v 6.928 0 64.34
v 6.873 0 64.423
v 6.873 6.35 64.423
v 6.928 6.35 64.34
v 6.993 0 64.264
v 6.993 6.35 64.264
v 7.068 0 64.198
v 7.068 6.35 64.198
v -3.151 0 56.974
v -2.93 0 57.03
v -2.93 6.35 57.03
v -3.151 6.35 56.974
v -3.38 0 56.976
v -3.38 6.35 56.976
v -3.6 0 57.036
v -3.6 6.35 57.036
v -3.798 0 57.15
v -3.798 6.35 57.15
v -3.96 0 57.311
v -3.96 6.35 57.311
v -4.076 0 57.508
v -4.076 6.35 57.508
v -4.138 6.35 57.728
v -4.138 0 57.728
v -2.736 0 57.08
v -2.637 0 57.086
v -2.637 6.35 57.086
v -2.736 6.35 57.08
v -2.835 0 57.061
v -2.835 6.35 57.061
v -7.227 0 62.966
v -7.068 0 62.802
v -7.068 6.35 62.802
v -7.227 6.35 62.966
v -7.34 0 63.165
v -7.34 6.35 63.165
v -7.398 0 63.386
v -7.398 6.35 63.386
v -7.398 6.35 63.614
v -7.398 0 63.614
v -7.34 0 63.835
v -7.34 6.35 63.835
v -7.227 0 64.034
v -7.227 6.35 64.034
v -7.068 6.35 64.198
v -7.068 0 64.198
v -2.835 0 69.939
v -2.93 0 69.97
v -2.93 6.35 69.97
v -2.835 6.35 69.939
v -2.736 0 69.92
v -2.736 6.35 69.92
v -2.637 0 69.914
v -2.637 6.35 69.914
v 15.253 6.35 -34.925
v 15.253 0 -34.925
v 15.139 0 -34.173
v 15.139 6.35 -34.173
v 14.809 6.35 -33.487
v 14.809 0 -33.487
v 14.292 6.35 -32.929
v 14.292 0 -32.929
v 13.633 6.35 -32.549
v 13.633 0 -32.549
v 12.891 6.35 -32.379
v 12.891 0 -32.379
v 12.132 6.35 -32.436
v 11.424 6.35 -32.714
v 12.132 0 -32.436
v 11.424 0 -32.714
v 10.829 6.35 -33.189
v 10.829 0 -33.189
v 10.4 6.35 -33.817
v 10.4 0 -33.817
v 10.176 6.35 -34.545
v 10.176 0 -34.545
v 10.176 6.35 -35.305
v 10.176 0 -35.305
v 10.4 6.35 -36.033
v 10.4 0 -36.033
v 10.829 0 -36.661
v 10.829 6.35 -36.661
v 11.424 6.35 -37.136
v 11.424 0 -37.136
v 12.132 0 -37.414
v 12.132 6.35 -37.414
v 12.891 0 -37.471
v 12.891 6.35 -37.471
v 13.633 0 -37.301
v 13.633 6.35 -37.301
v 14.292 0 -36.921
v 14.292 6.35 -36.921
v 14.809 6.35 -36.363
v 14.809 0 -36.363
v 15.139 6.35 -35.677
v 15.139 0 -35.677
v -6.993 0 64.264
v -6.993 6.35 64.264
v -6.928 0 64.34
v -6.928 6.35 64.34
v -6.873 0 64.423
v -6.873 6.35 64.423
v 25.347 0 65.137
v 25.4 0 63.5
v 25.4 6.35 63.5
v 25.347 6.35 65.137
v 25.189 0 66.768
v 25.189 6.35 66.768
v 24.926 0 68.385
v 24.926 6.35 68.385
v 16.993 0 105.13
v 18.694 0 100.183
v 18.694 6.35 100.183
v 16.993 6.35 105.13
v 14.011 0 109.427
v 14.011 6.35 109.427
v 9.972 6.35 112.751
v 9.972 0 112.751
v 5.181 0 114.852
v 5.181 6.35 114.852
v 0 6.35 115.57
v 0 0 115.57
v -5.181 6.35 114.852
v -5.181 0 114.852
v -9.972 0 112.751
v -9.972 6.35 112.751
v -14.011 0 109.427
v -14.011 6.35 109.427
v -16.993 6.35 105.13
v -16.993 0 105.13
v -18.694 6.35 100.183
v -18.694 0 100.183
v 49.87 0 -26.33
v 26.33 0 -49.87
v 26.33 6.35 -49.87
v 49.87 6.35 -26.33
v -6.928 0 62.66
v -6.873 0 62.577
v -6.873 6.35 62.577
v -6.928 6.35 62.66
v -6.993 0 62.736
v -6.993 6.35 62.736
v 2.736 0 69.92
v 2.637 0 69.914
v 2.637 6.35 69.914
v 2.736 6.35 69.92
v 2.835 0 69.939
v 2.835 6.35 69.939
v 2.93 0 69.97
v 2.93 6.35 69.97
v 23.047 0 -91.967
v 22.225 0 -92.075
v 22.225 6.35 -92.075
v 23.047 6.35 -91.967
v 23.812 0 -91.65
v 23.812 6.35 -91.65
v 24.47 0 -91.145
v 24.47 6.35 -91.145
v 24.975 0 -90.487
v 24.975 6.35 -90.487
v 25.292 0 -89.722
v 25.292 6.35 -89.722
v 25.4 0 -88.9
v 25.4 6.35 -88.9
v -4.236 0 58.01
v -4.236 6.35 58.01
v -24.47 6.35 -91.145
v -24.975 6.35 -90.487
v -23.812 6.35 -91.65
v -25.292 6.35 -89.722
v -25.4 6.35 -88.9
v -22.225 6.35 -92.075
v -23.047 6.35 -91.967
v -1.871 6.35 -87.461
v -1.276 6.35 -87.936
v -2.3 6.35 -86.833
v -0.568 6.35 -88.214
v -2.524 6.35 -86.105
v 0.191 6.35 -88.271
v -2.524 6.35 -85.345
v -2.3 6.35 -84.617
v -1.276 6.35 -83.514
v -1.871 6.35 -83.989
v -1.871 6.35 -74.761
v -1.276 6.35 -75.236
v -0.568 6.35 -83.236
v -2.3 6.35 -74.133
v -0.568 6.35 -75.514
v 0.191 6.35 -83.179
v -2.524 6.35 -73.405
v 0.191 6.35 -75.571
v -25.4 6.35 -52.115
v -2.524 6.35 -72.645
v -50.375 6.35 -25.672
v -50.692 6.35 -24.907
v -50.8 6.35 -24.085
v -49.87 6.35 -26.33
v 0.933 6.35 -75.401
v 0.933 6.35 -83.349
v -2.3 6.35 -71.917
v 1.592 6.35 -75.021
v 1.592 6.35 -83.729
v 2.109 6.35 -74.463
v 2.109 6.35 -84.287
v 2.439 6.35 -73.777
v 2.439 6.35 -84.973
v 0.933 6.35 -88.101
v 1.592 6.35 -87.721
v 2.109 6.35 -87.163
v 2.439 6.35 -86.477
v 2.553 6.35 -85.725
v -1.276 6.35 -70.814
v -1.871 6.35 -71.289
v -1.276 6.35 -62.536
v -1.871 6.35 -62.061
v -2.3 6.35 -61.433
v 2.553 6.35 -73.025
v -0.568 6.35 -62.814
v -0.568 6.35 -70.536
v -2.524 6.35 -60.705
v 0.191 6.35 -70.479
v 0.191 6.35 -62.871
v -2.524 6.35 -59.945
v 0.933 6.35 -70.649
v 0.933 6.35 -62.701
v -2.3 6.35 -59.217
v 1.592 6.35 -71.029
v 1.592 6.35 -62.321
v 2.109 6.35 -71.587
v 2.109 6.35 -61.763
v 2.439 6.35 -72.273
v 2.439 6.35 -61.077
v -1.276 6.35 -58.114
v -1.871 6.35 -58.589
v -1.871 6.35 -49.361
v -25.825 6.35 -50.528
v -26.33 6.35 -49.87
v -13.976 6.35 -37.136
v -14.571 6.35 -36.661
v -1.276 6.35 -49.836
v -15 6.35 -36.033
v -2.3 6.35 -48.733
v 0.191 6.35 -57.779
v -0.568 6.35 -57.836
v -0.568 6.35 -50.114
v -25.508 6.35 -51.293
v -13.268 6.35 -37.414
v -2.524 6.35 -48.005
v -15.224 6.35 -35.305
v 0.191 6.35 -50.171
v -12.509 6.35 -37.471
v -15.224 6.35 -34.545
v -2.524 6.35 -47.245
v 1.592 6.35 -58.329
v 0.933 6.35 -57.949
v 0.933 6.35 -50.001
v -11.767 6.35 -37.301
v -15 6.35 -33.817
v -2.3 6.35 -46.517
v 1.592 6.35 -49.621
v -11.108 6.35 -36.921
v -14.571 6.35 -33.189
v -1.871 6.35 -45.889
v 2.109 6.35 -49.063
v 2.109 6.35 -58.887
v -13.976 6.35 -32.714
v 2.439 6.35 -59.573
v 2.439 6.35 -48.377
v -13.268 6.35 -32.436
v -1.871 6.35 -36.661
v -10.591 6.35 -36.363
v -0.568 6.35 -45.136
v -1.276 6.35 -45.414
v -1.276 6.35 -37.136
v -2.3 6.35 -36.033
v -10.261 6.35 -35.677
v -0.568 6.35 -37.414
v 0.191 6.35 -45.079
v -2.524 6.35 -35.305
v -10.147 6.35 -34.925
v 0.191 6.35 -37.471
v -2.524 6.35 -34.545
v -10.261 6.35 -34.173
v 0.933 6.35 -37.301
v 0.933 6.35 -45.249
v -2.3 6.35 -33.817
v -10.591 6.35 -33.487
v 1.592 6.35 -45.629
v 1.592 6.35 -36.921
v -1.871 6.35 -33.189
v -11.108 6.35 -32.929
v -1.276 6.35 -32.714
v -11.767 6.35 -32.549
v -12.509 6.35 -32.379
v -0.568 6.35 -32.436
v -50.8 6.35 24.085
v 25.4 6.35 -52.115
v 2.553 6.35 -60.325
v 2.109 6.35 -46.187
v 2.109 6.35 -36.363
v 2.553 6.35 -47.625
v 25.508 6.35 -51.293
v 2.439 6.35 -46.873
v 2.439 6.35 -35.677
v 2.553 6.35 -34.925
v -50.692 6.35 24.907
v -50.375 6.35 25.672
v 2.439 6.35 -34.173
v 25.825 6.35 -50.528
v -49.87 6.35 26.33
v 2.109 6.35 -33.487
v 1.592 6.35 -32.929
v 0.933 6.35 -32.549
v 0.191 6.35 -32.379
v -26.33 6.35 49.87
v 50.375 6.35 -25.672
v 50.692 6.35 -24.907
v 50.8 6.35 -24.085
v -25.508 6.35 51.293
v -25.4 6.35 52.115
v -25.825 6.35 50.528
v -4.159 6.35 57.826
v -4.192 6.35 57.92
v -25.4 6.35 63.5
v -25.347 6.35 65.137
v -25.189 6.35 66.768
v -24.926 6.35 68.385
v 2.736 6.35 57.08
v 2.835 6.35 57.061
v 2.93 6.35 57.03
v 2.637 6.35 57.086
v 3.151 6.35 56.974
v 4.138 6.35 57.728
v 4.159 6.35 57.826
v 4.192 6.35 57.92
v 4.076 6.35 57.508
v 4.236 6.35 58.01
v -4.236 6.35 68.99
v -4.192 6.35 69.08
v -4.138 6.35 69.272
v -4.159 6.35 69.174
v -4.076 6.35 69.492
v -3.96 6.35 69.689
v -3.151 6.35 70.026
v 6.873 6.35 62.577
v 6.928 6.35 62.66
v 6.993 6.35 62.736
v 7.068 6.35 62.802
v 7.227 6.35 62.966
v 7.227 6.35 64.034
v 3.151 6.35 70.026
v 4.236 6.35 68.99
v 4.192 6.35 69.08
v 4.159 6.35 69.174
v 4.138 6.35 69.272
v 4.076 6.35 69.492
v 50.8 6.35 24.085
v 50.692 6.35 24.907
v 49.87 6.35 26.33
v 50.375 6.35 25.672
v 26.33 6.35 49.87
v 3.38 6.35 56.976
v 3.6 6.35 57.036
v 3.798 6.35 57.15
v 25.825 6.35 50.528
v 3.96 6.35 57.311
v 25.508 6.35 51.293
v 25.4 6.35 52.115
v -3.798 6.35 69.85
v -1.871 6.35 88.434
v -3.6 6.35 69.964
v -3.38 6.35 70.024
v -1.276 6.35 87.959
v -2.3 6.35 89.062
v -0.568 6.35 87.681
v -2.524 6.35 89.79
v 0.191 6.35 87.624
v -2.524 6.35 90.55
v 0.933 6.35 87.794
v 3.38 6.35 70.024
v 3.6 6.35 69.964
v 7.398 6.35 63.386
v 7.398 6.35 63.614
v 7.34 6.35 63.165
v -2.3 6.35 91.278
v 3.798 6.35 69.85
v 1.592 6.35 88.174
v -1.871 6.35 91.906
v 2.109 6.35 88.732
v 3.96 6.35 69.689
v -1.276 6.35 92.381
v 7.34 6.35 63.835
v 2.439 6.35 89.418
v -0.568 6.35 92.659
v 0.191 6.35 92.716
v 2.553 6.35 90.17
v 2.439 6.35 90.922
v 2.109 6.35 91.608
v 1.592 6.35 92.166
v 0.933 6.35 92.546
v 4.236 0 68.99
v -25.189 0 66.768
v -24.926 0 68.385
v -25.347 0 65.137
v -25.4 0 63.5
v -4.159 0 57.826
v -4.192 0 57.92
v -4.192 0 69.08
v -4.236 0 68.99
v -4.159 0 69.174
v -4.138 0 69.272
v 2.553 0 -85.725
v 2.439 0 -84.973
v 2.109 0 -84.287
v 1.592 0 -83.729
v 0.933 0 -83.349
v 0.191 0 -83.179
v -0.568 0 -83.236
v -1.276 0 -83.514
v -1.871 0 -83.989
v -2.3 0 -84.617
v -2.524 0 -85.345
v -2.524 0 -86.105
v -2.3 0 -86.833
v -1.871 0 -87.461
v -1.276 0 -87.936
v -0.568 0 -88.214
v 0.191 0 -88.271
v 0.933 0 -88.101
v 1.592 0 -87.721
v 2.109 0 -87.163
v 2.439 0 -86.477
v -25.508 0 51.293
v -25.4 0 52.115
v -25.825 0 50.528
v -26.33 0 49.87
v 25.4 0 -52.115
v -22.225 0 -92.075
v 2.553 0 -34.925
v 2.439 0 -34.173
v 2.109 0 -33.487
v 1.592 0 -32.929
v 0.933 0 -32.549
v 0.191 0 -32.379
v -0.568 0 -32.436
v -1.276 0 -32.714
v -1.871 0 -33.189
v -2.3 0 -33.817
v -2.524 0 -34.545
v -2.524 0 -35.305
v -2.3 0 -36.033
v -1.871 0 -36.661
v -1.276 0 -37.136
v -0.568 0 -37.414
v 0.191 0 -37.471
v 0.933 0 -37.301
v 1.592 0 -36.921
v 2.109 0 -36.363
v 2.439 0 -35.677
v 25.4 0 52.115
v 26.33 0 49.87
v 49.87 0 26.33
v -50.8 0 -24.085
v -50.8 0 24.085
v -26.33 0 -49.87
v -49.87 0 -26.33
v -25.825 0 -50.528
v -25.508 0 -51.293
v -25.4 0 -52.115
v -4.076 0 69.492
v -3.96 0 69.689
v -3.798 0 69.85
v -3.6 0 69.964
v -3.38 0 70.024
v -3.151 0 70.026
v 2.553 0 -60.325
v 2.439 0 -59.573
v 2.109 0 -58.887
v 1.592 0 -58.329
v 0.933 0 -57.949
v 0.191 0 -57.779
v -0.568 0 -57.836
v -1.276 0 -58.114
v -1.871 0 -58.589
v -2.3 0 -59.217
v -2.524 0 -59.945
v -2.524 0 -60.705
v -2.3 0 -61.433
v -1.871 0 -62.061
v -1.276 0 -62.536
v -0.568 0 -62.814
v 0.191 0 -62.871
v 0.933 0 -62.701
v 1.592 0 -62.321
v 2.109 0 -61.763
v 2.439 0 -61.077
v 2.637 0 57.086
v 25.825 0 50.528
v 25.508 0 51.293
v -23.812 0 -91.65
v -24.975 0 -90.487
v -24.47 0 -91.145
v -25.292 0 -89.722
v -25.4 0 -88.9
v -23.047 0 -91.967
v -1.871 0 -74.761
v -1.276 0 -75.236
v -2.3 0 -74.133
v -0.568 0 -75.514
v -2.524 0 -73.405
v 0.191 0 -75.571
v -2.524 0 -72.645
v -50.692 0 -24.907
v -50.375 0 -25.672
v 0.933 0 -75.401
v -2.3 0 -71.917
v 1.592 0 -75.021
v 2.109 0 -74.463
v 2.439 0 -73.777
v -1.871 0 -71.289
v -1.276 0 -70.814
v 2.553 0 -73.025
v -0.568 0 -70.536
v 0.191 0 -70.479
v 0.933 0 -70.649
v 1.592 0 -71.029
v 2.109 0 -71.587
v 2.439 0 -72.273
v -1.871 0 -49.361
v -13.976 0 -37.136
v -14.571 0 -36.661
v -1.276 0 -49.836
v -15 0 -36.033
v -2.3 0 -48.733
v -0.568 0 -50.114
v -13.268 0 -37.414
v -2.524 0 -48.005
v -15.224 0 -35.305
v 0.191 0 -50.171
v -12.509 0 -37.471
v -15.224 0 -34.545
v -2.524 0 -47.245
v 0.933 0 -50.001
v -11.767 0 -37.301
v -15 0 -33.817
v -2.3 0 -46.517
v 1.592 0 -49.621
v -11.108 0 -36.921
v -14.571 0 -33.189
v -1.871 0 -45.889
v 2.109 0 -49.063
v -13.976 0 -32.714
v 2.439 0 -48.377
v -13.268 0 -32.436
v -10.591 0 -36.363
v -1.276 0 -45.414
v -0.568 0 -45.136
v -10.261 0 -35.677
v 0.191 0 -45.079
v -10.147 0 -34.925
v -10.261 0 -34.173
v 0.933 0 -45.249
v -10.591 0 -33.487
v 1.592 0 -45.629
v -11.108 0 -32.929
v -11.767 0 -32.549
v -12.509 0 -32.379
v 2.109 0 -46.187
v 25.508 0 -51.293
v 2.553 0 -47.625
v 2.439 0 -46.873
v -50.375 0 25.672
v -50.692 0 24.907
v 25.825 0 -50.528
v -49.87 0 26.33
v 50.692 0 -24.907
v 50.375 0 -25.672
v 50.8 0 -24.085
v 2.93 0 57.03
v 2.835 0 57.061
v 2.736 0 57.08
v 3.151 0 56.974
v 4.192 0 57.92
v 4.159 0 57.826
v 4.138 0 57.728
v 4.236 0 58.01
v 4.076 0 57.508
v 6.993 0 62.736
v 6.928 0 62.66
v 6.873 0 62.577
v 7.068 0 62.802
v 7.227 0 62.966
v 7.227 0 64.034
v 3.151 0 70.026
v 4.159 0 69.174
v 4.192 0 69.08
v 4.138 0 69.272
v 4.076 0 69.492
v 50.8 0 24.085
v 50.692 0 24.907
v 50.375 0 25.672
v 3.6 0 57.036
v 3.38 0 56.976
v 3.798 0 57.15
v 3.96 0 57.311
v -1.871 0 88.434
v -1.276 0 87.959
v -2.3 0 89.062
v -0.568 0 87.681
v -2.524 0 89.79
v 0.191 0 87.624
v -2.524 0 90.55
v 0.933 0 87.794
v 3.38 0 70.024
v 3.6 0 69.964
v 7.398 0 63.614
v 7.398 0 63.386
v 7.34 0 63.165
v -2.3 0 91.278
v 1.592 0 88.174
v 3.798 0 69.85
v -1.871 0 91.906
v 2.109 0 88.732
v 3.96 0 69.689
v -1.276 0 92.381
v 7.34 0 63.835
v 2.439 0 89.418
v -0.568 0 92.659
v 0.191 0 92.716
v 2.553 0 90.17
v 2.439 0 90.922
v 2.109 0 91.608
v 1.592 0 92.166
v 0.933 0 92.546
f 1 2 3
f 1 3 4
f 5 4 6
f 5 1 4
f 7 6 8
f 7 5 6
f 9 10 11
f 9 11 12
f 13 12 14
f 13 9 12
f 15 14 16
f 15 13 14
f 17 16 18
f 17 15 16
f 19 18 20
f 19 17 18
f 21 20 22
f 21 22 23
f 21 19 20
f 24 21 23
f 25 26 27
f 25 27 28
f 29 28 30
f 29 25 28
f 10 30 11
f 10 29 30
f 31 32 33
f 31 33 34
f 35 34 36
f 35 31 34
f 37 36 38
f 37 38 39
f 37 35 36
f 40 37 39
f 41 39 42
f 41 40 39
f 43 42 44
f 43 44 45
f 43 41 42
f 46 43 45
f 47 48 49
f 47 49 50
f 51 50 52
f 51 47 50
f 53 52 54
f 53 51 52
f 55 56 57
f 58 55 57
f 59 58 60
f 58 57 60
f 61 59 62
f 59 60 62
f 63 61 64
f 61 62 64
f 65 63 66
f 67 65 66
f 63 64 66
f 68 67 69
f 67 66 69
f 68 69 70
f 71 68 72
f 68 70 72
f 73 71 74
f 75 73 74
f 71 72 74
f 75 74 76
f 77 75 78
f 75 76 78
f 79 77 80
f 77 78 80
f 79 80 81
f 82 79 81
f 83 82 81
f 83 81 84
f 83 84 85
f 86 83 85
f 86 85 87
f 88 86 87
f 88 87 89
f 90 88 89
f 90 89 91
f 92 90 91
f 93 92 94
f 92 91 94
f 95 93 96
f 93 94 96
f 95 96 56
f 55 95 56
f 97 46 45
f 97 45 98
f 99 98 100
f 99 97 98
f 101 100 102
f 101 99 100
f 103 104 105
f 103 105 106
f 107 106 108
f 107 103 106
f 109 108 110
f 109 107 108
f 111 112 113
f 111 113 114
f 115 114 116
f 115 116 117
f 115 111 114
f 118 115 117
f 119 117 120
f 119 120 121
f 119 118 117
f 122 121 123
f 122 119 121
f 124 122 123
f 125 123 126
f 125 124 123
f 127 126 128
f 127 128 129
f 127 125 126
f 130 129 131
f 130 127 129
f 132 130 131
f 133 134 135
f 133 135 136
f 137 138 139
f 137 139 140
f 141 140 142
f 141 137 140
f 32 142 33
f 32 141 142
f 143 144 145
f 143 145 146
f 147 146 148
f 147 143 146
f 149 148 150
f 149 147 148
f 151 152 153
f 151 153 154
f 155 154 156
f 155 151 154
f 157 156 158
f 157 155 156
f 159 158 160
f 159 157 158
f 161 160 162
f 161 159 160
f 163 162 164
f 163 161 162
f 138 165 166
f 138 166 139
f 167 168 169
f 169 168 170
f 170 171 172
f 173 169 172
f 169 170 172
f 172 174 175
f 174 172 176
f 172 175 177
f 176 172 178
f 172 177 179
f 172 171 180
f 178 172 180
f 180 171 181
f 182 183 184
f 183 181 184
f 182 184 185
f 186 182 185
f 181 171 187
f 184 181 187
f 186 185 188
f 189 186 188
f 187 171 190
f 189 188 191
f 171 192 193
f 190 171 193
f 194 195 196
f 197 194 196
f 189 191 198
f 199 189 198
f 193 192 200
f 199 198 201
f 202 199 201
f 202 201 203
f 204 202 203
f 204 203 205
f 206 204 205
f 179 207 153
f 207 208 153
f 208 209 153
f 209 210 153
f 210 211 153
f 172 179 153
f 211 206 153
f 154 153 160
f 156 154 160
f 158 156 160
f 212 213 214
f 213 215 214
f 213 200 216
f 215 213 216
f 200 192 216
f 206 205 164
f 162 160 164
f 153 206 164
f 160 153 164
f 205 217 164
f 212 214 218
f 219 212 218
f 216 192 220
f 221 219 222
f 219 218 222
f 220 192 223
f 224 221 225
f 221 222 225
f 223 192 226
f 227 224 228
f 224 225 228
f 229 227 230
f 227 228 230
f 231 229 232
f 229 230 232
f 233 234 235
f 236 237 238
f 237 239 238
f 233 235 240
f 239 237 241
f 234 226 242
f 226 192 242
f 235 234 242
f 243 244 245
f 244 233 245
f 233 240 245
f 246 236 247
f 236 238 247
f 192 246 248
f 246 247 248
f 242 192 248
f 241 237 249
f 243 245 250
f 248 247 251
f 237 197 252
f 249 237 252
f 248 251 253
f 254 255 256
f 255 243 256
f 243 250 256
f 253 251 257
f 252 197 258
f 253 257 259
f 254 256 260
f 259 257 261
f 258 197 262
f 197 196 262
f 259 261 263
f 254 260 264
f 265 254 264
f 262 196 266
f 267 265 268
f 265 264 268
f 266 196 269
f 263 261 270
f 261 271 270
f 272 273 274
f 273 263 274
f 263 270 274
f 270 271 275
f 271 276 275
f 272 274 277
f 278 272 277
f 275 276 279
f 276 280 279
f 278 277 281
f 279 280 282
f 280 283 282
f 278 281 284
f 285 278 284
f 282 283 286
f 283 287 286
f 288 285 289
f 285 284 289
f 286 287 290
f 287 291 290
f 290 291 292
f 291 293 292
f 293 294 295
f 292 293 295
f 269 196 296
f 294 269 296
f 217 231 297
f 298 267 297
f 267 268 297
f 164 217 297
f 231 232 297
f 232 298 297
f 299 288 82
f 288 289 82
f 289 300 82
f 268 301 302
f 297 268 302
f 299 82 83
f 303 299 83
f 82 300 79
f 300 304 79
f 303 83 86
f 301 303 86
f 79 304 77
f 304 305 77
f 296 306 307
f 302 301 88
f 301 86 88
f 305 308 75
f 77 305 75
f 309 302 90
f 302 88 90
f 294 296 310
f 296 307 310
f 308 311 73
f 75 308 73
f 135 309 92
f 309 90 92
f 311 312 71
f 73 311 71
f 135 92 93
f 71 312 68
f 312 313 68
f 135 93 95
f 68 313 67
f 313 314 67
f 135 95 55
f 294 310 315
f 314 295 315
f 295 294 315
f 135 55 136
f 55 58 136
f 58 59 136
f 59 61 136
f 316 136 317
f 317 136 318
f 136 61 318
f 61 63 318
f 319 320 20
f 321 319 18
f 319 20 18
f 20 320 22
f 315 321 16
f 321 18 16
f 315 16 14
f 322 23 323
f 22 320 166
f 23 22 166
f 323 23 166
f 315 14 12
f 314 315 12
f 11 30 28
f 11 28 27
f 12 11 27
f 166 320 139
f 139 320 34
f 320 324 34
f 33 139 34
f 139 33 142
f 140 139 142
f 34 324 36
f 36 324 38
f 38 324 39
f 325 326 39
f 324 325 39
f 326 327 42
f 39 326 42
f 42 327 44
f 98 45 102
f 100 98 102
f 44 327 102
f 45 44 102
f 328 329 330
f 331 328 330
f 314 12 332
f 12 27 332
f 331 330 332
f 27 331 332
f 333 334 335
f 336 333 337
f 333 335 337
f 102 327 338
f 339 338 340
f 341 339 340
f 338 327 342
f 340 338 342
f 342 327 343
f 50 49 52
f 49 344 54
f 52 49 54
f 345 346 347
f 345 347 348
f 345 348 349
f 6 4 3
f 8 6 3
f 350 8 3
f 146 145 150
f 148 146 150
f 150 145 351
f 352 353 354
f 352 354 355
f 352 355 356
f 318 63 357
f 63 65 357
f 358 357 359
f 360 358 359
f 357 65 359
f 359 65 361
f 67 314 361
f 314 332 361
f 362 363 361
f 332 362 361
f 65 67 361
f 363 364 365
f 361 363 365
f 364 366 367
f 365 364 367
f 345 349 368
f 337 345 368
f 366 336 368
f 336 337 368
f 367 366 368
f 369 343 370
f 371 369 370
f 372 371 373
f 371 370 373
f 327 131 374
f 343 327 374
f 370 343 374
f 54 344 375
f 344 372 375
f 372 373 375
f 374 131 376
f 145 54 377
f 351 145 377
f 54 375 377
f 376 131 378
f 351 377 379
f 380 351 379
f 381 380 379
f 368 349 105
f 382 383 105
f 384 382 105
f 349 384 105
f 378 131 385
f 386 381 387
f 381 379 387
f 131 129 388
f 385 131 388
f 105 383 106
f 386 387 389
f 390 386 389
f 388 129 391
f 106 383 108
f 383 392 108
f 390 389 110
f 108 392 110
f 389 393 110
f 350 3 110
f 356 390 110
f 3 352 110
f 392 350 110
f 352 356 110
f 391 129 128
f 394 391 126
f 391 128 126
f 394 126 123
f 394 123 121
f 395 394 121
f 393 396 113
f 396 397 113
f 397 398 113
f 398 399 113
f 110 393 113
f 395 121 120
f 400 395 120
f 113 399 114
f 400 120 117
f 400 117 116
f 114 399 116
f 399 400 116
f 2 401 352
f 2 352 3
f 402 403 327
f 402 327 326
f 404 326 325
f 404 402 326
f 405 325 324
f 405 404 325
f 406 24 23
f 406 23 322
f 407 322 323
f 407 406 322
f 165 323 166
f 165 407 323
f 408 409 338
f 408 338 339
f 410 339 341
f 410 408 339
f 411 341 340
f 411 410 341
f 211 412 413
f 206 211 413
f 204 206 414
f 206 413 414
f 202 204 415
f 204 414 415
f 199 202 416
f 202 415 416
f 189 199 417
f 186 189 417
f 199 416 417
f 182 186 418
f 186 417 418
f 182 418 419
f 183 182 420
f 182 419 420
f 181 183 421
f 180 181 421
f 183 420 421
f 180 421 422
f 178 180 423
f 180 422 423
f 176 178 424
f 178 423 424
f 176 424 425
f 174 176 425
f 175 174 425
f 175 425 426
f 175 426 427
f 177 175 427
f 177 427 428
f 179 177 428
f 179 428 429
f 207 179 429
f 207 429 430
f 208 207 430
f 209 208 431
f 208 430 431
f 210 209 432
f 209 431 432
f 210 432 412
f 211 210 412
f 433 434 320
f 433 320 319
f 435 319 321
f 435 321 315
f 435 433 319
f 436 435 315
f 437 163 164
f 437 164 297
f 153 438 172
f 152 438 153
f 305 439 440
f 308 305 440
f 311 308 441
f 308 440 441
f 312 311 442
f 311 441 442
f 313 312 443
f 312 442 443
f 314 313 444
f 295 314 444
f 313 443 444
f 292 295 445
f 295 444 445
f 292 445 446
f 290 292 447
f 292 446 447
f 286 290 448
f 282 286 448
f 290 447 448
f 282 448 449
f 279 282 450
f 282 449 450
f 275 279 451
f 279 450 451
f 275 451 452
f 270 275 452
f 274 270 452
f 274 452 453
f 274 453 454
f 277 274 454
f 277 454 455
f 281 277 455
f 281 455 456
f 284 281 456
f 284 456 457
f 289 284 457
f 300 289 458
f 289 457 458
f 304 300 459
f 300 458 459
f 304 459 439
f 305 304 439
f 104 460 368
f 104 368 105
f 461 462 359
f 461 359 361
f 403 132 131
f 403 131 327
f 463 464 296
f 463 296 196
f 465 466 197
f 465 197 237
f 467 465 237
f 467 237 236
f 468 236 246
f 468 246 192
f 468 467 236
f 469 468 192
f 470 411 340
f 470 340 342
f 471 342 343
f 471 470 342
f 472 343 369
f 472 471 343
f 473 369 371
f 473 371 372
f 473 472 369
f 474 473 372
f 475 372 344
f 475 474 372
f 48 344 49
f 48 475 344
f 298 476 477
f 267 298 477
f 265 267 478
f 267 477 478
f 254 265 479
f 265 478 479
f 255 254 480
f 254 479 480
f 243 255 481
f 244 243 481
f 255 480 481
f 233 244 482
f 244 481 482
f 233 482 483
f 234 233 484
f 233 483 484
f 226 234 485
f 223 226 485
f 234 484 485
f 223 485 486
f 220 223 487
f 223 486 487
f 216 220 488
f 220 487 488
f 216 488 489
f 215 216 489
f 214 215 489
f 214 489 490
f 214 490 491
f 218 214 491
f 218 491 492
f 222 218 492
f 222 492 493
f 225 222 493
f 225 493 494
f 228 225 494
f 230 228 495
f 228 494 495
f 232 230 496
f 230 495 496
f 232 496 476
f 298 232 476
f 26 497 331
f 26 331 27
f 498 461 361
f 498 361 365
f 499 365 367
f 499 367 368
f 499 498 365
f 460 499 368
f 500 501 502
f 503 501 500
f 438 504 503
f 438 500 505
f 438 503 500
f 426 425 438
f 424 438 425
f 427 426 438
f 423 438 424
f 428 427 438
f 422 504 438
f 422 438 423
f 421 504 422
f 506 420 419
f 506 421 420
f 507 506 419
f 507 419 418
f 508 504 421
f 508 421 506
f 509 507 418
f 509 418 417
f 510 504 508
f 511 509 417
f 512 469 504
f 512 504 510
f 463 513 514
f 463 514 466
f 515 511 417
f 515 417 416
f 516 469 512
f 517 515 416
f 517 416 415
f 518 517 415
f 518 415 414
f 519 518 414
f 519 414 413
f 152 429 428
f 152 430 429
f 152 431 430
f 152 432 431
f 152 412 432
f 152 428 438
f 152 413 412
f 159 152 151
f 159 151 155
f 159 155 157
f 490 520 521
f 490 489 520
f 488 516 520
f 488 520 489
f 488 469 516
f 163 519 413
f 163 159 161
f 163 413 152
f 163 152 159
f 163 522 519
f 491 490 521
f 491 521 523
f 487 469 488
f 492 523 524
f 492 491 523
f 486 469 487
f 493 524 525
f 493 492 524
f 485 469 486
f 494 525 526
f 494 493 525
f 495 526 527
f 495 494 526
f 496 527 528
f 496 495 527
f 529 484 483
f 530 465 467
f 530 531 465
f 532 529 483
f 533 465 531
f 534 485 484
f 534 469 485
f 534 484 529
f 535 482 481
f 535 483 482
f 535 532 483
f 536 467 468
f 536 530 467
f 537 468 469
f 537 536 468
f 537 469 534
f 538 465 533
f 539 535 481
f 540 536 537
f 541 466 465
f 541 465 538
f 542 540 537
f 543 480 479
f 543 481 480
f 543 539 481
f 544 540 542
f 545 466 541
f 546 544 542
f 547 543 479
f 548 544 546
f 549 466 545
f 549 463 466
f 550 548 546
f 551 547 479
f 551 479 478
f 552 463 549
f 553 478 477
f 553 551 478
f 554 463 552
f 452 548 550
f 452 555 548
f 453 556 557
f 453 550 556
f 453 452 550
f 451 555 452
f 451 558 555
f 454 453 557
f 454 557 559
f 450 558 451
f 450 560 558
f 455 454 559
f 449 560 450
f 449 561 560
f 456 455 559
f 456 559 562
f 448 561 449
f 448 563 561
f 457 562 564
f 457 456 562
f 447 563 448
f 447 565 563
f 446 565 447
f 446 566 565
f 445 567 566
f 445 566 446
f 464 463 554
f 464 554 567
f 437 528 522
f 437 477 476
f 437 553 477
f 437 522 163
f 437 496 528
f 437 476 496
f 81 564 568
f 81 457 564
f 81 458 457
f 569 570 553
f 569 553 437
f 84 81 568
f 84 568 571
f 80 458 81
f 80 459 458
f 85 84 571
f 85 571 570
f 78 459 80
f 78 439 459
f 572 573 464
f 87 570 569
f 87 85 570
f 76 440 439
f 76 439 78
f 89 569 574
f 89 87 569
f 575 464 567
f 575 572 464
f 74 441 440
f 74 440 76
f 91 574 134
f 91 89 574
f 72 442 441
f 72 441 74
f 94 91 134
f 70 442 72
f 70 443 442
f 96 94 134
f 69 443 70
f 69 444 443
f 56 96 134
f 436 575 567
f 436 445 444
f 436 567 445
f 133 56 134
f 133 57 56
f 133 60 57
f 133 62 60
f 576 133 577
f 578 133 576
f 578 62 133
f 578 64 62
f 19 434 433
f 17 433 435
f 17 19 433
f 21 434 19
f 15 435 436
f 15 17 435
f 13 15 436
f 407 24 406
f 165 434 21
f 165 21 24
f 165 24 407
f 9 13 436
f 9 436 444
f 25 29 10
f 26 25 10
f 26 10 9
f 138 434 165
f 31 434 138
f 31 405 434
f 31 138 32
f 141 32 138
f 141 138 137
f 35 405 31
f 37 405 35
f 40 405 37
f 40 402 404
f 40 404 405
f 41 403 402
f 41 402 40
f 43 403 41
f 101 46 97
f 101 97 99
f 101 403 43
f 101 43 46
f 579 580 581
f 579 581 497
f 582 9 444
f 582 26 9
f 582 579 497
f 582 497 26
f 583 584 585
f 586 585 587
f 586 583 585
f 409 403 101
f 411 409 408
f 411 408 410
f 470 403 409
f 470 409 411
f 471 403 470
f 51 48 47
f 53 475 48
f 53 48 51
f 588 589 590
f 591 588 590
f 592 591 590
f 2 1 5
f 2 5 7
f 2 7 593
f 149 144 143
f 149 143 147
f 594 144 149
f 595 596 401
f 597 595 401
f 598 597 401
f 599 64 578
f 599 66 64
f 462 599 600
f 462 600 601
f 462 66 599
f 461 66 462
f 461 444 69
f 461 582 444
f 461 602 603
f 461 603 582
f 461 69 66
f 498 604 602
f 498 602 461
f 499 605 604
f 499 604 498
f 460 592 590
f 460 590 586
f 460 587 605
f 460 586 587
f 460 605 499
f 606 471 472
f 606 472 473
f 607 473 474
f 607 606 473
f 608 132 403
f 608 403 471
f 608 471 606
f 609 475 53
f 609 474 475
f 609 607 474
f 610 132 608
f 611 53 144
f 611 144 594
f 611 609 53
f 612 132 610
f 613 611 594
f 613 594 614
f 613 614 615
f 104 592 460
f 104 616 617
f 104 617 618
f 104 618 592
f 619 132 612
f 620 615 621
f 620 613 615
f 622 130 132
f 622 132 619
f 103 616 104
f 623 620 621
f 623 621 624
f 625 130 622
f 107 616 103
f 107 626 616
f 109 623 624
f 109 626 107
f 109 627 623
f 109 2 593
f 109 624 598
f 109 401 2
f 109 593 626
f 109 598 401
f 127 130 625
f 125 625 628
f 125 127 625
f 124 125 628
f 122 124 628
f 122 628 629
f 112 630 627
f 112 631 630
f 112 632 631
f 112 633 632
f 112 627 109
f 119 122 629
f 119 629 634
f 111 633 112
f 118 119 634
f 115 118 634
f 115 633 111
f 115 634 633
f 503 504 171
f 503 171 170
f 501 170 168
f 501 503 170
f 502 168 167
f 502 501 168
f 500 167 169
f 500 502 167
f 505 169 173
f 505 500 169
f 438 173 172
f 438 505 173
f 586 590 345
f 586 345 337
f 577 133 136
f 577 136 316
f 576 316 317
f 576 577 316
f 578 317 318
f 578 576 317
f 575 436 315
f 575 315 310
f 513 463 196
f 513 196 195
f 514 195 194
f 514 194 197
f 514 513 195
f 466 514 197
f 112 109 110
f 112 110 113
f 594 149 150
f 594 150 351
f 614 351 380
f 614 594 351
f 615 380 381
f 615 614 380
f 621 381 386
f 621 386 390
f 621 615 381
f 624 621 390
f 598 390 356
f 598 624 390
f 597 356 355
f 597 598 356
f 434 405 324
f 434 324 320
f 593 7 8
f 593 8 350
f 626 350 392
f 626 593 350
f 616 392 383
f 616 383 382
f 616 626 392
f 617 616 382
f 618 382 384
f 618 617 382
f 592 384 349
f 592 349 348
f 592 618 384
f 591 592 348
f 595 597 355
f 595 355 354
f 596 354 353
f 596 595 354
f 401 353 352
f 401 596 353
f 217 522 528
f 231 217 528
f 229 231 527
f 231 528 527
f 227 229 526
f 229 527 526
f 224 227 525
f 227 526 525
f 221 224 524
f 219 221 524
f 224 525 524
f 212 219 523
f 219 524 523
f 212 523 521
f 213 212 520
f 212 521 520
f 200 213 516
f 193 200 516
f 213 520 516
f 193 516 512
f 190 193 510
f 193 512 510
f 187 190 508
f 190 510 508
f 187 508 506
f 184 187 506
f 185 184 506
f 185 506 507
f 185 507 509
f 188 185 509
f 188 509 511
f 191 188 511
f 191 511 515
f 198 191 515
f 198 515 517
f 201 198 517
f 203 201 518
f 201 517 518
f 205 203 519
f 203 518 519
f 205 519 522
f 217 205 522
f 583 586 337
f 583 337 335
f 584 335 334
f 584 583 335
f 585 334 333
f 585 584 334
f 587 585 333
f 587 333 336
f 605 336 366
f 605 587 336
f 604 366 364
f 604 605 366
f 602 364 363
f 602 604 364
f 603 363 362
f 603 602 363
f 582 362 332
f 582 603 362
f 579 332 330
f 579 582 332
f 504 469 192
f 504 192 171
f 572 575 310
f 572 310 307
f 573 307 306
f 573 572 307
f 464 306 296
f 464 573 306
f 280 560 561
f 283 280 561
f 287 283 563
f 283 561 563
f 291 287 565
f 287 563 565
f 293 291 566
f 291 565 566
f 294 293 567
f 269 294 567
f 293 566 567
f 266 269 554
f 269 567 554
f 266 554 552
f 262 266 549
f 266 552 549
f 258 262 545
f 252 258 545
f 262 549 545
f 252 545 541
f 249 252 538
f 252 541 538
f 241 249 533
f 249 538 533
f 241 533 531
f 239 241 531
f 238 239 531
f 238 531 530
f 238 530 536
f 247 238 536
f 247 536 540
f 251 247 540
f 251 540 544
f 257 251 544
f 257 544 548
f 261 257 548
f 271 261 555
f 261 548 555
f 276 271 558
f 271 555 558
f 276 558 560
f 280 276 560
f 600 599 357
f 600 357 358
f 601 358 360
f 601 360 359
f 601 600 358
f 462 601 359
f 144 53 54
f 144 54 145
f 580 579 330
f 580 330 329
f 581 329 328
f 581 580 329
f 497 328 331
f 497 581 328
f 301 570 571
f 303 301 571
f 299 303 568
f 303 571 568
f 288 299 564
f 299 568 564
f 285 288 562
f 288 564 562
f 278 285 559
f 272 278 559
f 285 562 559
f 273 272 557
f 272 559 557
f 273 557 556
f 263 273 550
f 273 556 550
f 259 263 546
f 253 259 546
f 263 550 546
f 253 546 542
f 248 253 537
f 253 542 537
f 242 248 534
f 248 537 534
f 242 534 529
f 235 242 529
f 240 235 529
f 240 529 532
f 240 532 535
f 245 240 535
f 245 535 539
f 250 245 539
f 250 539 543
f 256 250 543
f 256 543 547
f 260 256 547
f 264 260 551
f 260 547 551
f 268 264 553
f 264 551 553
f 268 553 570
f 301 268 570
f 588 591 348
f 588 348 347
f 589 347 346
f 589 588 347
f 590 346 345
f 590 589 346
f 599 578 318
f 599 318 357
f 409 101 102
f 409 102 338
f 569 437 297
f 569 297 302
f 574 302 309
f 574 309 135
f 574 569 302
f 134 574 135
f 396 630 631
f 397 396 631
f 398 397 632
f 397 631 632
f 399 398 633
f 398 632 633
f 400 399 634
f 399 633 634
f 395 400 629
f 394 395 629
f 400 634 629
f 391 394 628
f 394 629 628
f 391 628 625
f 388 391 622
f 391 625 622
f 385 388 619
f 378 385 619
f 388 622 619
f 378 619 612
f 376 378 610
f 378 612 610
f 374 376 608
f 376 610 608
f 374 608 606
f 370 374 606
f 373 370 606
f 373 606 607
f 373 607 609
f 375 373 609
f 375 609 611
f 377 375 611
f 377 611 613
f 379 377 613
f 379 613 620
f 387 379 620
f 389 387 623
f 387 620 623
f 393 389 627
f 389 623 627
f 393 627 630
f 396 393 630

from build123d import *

# Parameters (mm, degrees)
SKETCH1_R           = 2.5527
BOSS_EXTRUDE1_DEPTH = 6.35


with BuildPart() as part:
    # Sketch1 → Boss-Extrude1 (new body)
    with BuildSketch(Plane.XZ):
        with BuildLine():
            Line((-50.8, 24.084871939), (-50.8, -24.084871939))
            ThreePointArc((-50.8, -24.084871939), (-50.558317516, -25.299891837), (-49.87006403, -26.32993597))
            Line((-49.87006403, -26.32993597), (-26.32993597, -49.87006403))
            ThreePointArc((-26.32993597, -49.87006403), (-25.641682484, -50.900108163), (-25.4, -52.115128061))
            Line((-25.4, -52.115128061), (-25.4, -88.9))
            ThreePointArc((-25.4, -88.9), (-24.47006403, -91.14506403), (-22.225, -92.075))
            Line((-22.225, -92.075), (22.225, -92.075))
            ThreePointArc((22.225, -92.075), (24.47006403, -91.14506403), (25.4, -88.9))
            Line((25.4, -88.9), (25.4, -52.115128061))
            ThreePointArc((25.4, -52.115128061), (25.641682484, -50.900108163), (26.32993597, -49.87006403))
            Line((26.32993597, -49.87006403), (49.87006403, -26.32993597))
            ThreePointArc((49.87006403, -26.32993597), (50.558317516, -25.299891837), (50.8, -24.084871939))
            Line((50.8, -24.084871939), (50.8, 24.084871939))
            ThreePointArc((50.8, 24.084871939), (50.558317516, 25.299891837), (49.87006403, 26.32993597))
            Line((49.87006403, 26.32993597), (26.32993597, 49.87006403))
            ThreePointArc((26.32993597, 49.87006403), (25.641682484, 50.900108163), (25.4, 52.115128061))
            Line((25.4, 52.115128061), (25.4, 63.5))
            ThreePointArc((25.4, 63.5), (25.281197373, 65.953784703), (24.925900837, 68.384615385))
            Line((24.925900837, 68.384615385), (18.694425628, 100.183461538))
            ThreePointArc((18.694425628, 100.183461538), (0, 115.57), (-18.694425628, 100.183461538))
            Line((-18.694425628, 100.183461538), (-24.925900837, 68.384615385))
            ThreePointArc((-24.925900837, 68.384615385), (-25.281197373, 65.953784703), (-25.4, 63.5))
            Line((-25.4, 63.5), (-25.4, 52.115128061))
            ThreePointArc((-25.4, 52.115128061), (-25.641682484, 50.900108163), (-26.32993597, 49.87006403))
            Line((-26.32993597, 49.87006403), (-49.87006403, 26.32993597))
            ThreePointArc((-49.87006403, 26.32993597), (-50.558317516, 25.299891837), (-50.8, 24.084871939))
        make_face()
        with Locations((0, 90.17)):
            Circle(SKETCH1_R, mode=Mode.SUBTRACT)
        with Locations((0, -85.725)):
            Circle(SKETCH1_R, mode=Mode.SUBTRACT)
        with Locations((0, -73.025)):
            Circle(SKETCH1_R, mode=Mode.SUBTRACT)
        with Locations((0, -60.325)):
            Circle(SKETCH1_R, mode=Mode.SUBTRACT)
        with Locations((0, -47.625)):
            Circle(SKETCH1_R, mode=Mode.SUBTRACT)
        with Locations((0, -34.925)):
            Circle(SKETCH1_R, mode=Mode.SUBTRACT)
        with Locations((-12.7, -34.925)):
            Circle(SKETCH1_R, mode=Mode.SUBTRACT)
        with Locations((12.7, -34.925)):
            Circle(SKETCH1_R, mode=Mode.SUBTRACT)
        with BuildLine():
            Line((-6.872513185, 64.423457988), (-4.235994669, 68.990042012))
            ThreePointArc((-4.235994669, 68.990042012), (-4.173607217, 69.126443703), (-4.137993663, 69.272146448))
            ThreePointArc((-4.137993663, 69.272146448), (-3.702835951, 69.9135), (-2.929828627, 69.969680857))
            ThreePointArc((-2.929828627, 69.969680857), (-2.785839571, 69.927671726), (-2.636518516, 69.9135))
            Line((-2.636518516, 69.9135), (2.636518516, 69.9135))
            ThreePointArc((2.636518516, 69.9135), (2.785839571, 69.927671726), (2.929828627, 69.969680857))
            ThreePointArc((2.929828627, 69.969680857), (3.702835951, 69.9135), (4.137993663, 69.272146448))
            ThreePointArc((4.137993663, 69.272146448), (4.173607217, 69.126443703), (4.235994669, 68.990042012))
            Line((4.235994669, 68.990042012), (6.872513185, 64.423457988))
            ThreePointArc((6.872513185, 64.423457988), (6.959446788, 64.301228024), (7.06782229, 64.197534409))
            ThreePointArc((7.06782229, 64.197534409), (7.405671903, 63.5), (7.06782229, 62.802465591))
            ThreePointArc((7.06782229, 62.802465591), (6.959446788, 62.698771976), (6.872513185, 62.576542012))
            Line((6.872513185, 62.576542012), (4.235994669, 58.009957988))
            ThreePointArc((4.235994669, 58.009957988), (4.173607217, 57.873556297), (4.137993663, 57.727853552))
            ThreePointArc((4.137993663, 57.727853552), (3.702835951, 57.0865), (2.929828627, 57.030319143))
            ThreePointArc((2.929828627, 57.030319143), (2.785839571, 57.072328274), (2.636518516, 57.0865))
            Line((2.636518516, 57.0865), (-2.636518516, 57.0865))
            ThreePointArc((-2.636518516, 57.0865), (-2.785839571, 57.072328274), (-2.929828627, 57.030319143))
            ThreePointArc((-2.929828627, 57.030319143), (-3.702835951, 57.0865), (-4.137993663, 57.727853552))
            ThreePointArc((-4.137993663, 57.727853552), (-4.173607217, 57.873556297), (-4.235994669, 58.009957988))
            Line((-4.235994669, 58.009957988), (-6.872513185, 62.576542012))
            ThreePointArc((-6.872513185, 62.576542012), (-6.959446788, 62.698771976), (-7.06782229, 62.802465591))
            ThreePointArc((-7.06782229, 62.802465591), (-7.405671903, 63.5), (-7.06782229, 64.197534409))
            ThreePointArc((-7.06782229, 64.197534409), (-6.959446788, 64.301228024), (-6.872513185, 64.423457988))
        make_face(mode=Mode.SUBTRACT)
    extrude(amount=-BOSS_EXTRUDE1_DEPTH)


solid = part.part
